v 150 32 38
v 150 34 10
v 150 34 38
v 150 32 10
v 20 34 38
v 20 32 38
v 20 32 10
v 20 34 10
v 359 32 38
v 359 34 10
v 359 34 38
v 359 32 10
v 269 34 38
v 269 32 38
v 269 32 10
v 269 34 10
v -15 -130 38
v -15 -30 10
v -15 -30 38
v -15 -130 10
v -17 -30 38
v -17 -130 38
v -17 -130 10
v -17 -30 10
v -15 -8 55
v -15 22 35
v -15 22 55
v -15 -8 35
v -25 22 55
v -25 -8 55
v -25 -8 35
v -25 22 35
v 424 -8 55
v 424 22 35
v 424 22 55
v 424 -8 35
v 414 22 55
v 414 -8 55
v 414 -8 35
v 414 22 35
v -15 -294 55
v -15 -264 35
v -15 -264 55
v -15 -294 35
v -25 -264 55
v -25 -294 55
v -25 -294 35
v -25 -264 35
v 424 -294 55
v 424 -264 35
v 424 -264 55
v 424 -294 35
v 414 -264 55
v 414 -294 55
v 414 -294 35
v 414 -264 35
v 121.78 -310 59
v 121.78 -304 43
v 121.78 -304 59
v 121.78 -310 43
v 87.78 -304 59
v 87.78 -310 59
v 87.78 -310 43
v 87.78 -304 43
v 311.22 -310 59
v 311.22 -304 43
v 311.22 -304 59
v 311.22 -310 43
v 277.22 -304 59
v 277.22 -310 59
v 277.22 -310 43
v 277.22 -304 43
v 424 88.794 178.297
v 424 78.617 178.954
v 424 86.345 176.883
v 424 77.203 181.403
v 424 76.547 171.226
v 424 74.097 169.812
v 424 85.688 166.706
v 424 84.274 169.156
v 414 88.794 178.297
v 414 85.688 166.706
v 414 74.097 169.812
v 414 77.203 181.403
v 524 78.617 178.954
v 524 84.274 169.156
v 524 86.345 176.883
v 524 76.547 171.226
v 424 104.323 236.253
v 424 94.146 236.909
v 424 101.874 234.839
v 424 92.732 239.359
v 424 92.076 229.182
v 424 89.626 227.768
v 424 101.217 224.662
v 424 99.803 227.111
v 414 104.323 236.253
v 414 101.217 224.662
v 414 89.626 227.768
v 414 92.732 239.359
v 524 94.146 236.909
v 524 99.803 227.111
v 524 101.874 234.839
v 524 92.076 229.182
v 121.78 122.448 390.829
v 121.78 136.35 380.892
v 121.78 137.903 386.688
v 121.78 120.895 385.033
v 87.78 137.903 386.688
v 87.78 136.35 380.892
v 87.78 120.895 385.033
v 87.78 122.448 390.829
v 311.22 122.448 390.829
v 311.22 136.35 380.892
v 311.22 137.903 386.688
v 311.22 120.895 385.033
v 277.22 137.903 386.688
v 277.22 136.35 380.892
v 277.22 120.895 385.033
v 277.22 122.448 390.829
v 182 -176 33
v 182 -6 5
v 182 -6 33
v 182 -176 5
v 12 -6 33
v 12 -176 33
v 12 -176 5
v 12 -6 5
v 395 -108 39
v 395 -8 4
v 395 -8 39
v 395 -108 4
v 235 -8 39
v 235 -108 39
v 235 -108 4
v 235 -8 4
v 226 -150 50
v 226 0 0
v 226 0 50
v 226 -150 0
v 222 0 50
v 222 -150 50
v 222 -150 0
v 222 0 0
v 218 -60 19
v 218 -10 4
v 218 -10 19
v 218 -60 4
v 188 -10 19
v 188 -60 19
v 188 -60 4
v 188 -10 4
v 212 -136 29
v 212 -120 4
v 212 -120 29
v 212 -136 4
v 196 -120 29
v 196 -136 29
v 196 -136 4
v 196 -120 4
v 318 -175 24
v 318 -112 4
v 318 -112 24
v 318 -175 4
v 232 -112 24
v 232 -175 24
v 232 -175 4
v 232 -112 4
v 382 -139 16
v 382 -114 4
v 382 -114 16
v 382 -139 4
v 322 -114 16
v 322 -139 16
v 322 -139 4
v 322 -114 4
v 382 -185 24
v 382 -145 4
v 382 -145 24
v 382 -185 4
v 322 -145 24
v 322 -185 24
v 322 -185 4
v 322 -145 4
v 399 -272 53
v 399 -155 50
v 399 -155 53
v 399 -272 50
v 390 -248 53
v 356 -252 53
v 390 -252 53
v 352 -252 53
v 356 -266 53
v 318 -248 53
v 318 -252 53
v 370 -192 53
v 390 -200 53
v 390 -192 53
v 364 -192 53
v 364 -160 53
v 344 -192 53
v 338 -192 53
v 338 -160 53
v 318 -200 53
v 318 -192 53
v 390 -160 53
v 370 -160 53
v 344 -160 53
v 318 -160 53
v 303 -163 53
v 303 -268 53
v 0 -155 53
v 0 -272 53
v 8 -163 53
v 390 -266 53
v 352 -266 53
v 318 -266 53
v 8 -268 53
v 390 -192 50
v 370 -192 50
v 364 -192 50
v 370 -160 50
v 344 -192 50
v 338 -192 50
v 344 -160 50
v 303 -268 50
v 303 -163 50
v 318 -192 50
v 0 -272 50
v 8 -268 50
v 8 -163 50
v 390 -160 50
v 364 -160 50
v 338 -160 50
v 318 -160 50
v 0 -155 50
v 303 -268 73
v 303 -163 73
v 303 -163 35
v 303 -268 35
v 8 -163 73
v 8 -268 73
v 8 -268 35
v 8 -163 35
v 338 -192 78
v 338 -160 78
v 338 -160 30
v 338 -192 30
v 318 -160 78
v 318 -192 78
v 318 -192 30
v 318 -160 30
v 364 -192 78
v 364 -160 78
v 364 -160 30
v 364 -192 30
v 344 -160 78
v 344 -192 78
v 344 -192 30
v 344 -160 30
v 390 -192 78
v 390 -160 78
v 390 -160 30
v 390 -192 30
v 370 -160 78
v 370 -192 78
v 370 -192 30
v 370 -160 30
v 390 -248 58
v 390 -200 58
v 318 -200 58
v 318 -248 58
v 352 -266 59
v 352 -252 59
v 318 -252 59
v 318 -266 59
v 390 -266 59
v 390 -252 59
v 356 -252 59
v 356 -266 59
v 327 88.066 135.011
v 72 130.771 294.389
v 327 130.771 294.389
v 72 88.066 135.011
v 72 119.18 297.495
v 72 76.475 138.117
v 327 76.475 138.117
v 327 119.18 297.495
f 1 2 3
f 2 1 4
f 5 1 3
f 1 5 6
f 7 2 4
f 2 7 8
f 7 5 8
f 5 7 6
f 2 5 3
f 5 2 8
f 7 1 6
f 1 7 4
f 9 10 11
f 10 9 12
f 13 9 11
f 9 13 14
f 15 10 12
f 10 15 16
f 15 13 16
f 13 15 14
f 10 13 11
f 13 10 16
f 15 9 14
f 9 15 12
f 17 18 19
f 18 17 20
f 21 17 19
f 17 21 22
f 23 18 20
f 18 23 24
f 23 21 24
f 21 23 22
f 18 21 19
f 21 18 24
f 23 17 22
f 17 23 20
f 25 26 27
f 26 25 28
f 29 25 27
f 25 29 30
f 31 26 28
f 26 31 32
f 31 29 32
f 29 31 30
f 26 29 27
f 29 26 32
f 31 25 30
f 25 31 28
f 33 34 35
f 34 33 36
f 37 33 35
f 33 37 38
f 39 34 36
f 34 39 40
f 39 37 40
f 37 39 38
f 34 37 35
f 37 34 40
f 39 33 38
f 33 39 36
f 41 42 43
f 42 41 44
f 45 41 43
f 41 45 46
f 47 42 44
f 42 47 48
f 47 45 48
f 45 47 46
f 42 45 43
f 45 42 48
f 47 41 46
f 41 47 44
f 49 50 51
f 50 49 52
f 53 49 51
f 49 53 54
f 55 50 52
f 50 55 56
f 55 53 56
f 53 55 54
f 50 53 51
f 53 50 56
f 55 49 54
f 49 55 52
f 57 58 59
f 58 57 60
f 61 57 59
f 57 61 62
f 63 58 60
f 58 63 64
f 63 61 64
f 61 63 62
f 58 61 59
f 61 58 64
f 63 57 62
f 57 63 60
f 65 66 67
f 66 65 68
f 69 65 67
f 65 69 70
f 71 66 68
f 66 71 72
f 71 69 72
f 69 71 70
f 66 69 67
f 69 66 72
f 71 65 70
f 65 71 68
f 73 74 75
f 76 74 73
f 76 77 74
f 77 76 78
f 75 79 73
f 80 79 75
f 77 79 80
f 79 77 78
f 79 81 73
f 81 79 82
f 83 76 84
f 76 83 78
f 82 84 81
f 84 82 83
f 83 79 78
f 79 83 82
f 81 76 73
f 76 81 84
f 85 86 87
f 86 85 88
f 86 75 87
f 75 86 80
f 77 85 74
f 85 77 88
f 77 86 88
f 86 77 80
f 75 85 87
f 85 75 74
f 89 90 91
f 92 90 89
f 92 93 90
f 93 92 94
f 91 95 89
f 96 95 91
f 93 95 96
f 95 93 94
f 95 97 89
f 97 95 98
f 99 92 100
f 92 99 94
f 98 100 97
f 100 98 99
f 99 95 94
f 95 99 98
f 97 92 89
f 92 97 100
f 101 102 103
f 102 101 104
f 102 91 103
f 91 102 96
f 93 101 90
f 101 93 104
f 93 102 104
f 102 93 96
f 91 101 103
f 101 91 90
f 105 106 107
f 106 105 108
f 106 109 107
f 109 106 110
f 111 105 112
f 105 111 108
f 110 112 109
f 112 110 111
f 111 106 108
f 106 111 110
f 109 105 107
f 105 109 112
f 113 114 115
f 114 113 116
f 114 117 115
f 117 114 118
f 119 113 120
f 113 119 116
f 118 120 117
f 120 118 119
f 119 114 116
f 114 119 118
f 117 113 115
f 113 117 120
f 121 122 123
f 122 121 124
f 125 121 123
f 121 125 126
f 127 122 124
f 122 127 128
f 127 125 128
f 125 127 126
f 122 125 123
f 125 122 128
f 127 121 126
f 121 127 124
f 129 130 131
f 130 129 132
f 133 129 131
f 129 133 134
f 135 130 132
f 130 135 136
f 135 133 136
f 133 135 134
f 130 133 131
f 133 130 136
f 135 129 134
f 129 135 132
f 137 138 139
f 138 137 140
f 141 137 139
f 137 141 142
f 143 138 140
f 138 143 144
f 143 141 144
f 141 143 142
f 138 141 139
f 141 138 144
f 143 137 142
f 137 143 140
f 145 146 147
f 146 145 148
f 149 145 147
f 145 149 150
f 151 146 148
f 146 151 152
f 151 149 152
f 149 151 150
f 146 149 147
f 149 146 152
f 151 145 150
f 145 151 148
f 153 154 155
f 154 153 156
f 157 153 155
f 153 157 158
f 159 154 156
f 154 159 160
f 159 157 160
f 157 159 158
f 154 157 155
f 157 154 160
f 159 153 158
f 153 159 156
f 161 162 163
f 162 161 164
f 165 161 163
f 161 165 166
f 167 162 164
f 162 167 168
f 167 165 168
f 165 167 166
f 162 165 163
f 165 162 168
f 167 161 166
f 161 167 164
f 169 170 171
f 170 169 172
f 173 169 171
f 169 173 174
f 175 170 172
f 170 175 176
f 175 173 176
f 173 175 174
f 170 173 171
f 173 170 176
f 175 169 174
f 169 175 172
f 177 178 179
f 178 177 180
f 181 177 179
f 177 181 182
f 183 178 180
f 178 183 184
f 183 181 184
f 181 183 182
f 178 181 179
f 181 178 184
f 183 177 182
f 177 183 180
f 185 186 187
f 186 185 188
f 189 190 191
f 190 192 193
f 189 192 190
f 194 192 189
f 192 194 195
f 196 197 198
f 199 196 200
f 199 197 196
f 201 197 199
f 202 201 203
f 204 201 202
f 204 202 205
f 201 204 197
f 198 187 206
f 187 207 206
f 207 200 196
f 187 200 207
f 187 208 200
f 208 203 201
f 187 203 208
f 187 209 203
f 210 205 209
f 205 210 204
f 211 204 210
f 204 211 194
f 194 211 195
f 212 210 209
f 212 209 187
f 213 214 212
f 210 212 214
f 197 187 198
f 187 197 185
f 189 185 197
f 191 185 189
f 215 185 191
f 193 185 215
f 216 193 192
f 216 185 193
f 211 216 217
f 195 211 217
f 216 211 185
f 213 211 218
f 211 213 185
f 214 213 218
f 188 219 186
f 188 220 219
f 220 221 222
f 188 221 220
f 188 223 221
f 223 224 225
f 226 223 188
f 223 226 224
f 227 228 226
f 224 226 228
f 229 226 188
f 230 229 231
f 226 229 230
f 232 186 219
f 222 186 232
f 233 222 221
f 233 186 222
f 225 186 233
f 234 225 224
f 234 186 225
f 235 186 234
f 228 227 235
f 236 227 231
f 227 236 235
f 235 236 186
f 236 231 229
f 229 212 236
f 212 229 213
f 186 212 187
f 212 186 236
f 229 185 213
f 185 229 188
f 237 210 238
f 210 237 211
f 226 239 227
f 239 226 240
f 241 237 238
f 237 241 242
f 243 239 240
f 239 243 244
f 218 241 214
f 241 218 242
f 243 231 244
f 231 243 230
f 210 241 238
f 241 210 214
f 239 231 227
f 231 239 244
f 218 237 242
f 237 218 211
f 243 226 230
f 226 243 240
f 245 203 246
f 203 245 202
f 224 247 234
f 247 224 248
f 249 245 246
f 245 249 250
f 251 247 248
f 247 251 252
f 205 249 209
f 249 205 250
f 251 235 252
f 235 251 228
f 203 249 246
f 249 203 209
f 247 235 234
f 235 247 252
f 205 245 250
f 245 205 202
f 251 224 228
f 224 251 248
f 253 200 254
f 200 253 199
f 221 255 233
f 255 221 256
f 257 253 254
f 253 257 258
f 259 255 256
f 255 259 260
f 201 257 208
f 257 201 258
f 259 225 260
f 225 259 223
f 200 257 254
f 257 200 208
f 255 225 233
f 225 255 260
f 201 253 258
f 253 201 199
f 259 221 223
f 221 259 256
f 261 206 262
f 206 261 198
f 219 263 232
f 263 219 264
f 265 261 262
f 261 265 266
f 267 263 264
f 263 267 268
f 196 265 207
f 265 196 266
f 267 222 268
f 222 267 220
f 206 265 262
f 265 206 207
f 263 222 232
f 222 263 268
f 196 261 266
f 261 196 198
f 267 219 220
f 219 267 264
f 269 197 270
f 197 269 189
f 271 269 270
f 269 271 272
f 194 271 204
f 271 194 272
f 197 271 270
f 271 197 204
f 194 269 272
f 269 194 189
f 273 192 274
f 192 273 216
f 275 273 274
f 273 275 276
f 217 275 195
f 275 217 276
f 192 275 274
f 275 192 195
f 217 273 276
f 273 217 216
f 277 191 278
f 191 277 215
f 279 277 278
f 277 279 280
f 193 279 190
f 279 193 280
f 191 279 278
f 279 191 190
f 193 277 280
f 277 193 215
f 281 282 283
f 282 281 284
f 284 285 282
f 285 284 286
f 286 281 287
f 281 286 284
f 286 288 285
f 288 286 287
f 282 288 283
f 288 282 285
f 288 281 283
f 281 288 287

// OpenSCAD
// M.33 CyberDeck fit-check model, generated from fit-check/index.html by export_cad.py.
// Units: millimetres. Axes: X left to right, Y toward the back (hinge), Z up.
// Case: Pelican 1470. Part sizes other than the case are estimates until measured.
// Change lid_angle (0 = closed) and the show_* switches, then press F5 or F6.
// Edit sizes here for quick tries, but edit index.html and rerun the exporter to keep both in sync.

lid_angle = 105;
show_shell = true;
ghost_shell = true; // see-through in preview (F5); set false so F6 render and STL export include the shell
show_parts = true;
show_extras = true;

W = 399;
D = 272;
bd = 61;
ld = 37;
ws = 15;
wf = 32;
wb = 32;
fl = 8;

// Page frame box [x, y_up, z_front, w, h, d] -> CAD cube.
module pbox(b, col) { color(col) translate([b[0], -(b[2] + b[5]), b[1]]) cube([b[3], b[5], b[4]]); }
module lid_frame() { translate([0, wb, bd]) rotate([-lid_angle, 0, 0]) translate([0, -wb, -bd]) children(); }

module shell_base() {
  pbox([-15, -8, -32, 429, 8, 336], [0.23, 0.26, 0.31]);
  pbox([-15, 0, -32, 15, 61, 336], [0.23, 0.26, 0.31]);
  pbox([399, 0, -32, 15, 61, 336], [0.23, 0.26, 0.31]);
  pbox([0, 0, -32, 399, 61, 32], [0.23, 0.26, 0.31]);
  pbox([0, 0, 272, 399, 61, 32], [0.23, 0.26, 0.31]);
}
module shell_lid() {
  pbox([-15, 98, -32, 429, 8, 336], [0.23, 0.26, 0.31]);
  pbox([-15, 61, -32, 15, 37, 336], [0.23, 0.26, 0.31]);
  pbox([399, 61, -32, 15, 37, 336], [0.23, 0.26, 0.31]);
  pbox([0, 61, -32, 399, 37, 32], [0.23, 0.26, 0.31]);
  pbox([0, 61, 272, 399, 37, 32], [0.23, 0.26, 0.31]);
}
module extras_base() {
  pbox([20, 10, -34, 130, 28, 2], [0.56, 0.78, 0.75]); // Fan exhaust vent (back)
  pbox([269, 10, -34, 90, 28, 2], [0.89, 0.54, 0.23]); // Battery membrane vent (back)
  pbox([-17, 10, 30, 2, 28, 100], [0.55, 0.6, 0.66]); // Port panel (left end)
  pbox([-25, 35, -22, 10, 20, 30], [0.78, 0.8, 0.84]); // Corner clip back left
  pbox([414, 35, -22, 10, 20, 30], [0.78, 0.8, 0.84]); // Corner clip back right
  pbox([-25, 35, 264, 10, 20, 30], [0.78, 0.8, 0.84]); // Corner clip front left
  pbox([414, 35, 264, 10, 20, 30], [0.78, 0.8, 0.84]); // Corner clip front right
  pbox([87.78, 43, 304, 34, 16, 6], [0.16, 0.19, 0.22]); // Latch left (base half)
  pbox([277.22, 43, 304, 34, 16, 6], [0.16, 0.19, 0.22]); // Latch right (base half)
}
module extras_lid() {
  pbox([414, 73.5, 84, 10, 12, 12], [0.55, 0.59, 0.64]); // RP-SMA bulkhead 1
  pbox([424, 75.5, 86, 100, 8, 8], [0.16, 0.19, 0.22]); // Antenna 1
  pbox([414, 73.5, 144, 10, 12, 12], [0.55, 0.59, 0.64]); // RP-SMA bulkhead 2
  pbox([424, 75.5, 146, 100, 8, 8], [0.16, 0.19, 0.22]); // Antenna 2
  pbox([87.78, 63, 304, 34, 16, 6], [0.16, 0.19, 0.22]); // Latch left (lid half)
  pbox([277.22, 63, 304, 34, 16, 6], [0.16, 0.19, 0.22]); // Latch right (lid half)
}

// Parts: [x, y, z, w, h, d] as in the fit-check table. Lid parts use y = gap from the lid's inside face.
module parts_base() {
  pbox([12, 5, 6, 170, 28, 170], [0.12, 0.5, 0.48]); // Bare board with cooler
  pbox([235, 4, 8, 160, 35, 100], [0.89, 0.54, 0.23]); // Battery pack, 150 to 200 Wh
  pbox([222, 0, 0, 4, 50, 150], [0.1, 0.11, 0.13]); // Wall between bays
  pbox([188, 4, 10, 30, 15, 50], [0.45, 0.62, 0.3]); // 5 V converter
  pbox([196, 4, 120, 16, 25, 16], [0.84, 0.2, 0.2]); // Shutdown button
  pbox([232, 4, 112, 86, 20, 63], [0.2, 0.33, 0.62]); // Capture adapter
  pbox([322, 4, 114, 60, 12, 25], [0.35, 0.42, 0.72]); // USB hub
  pbox([322, 4, 145, 60, 20, 40], [0.5, 0.4, 0.7]); // USB switch (pass-through)
  pbox([0, 50, 155, 399, 3, 117], [0.3, 0.35, 0.42]); // Top plate (front zone)
  pbox([8, 35, 163, 295, 38, 105], [0.4, 0.46, 0.54]); // 60% keyboard
  pbox([318, 30, 160, 20, 48, 32], [0.8, 0.22, 0.22]); // Toggle 1: board power
  pbox([344, 30, 160, 20, 48, 32], [0.8, 0.22, 0.22]); // Toggle 2: screen power
  pbox([370, 30, 160, 20, 48, 32], [0.8, 0.22, 0.22]); // Toggle 3: pass-through
  pbox([318, 53, 200, 72, 5, 48], [0.13, 0.16, 0.2]); // Trackpad
  pbox([318, 53, 252, 34, 6, 14], [0.2, 0.24, 0.29]); // Mouse button, left
  pbox([356, 53, 252, 34, 6, 14], [0.2, 0.24, 0.29]); // Mouse button, right
}
module parts_lid() {
  pbox([72, 84, 54, 255, 12, 165], [0.06, 0.09, 0.11]); // Screen, 10.1 in panel
}

if (show_shell) { if (ghost_shell) { %shell_base(); lid_frame() %shell_lid(); } else { shell_base(); lid_frame() shell_lid(); } }
if (show_extras) { extras_base(); lid_frame() extras_lid(); }
if (show_parts) { parts_base(); lid_frame() parts_lid(); }
